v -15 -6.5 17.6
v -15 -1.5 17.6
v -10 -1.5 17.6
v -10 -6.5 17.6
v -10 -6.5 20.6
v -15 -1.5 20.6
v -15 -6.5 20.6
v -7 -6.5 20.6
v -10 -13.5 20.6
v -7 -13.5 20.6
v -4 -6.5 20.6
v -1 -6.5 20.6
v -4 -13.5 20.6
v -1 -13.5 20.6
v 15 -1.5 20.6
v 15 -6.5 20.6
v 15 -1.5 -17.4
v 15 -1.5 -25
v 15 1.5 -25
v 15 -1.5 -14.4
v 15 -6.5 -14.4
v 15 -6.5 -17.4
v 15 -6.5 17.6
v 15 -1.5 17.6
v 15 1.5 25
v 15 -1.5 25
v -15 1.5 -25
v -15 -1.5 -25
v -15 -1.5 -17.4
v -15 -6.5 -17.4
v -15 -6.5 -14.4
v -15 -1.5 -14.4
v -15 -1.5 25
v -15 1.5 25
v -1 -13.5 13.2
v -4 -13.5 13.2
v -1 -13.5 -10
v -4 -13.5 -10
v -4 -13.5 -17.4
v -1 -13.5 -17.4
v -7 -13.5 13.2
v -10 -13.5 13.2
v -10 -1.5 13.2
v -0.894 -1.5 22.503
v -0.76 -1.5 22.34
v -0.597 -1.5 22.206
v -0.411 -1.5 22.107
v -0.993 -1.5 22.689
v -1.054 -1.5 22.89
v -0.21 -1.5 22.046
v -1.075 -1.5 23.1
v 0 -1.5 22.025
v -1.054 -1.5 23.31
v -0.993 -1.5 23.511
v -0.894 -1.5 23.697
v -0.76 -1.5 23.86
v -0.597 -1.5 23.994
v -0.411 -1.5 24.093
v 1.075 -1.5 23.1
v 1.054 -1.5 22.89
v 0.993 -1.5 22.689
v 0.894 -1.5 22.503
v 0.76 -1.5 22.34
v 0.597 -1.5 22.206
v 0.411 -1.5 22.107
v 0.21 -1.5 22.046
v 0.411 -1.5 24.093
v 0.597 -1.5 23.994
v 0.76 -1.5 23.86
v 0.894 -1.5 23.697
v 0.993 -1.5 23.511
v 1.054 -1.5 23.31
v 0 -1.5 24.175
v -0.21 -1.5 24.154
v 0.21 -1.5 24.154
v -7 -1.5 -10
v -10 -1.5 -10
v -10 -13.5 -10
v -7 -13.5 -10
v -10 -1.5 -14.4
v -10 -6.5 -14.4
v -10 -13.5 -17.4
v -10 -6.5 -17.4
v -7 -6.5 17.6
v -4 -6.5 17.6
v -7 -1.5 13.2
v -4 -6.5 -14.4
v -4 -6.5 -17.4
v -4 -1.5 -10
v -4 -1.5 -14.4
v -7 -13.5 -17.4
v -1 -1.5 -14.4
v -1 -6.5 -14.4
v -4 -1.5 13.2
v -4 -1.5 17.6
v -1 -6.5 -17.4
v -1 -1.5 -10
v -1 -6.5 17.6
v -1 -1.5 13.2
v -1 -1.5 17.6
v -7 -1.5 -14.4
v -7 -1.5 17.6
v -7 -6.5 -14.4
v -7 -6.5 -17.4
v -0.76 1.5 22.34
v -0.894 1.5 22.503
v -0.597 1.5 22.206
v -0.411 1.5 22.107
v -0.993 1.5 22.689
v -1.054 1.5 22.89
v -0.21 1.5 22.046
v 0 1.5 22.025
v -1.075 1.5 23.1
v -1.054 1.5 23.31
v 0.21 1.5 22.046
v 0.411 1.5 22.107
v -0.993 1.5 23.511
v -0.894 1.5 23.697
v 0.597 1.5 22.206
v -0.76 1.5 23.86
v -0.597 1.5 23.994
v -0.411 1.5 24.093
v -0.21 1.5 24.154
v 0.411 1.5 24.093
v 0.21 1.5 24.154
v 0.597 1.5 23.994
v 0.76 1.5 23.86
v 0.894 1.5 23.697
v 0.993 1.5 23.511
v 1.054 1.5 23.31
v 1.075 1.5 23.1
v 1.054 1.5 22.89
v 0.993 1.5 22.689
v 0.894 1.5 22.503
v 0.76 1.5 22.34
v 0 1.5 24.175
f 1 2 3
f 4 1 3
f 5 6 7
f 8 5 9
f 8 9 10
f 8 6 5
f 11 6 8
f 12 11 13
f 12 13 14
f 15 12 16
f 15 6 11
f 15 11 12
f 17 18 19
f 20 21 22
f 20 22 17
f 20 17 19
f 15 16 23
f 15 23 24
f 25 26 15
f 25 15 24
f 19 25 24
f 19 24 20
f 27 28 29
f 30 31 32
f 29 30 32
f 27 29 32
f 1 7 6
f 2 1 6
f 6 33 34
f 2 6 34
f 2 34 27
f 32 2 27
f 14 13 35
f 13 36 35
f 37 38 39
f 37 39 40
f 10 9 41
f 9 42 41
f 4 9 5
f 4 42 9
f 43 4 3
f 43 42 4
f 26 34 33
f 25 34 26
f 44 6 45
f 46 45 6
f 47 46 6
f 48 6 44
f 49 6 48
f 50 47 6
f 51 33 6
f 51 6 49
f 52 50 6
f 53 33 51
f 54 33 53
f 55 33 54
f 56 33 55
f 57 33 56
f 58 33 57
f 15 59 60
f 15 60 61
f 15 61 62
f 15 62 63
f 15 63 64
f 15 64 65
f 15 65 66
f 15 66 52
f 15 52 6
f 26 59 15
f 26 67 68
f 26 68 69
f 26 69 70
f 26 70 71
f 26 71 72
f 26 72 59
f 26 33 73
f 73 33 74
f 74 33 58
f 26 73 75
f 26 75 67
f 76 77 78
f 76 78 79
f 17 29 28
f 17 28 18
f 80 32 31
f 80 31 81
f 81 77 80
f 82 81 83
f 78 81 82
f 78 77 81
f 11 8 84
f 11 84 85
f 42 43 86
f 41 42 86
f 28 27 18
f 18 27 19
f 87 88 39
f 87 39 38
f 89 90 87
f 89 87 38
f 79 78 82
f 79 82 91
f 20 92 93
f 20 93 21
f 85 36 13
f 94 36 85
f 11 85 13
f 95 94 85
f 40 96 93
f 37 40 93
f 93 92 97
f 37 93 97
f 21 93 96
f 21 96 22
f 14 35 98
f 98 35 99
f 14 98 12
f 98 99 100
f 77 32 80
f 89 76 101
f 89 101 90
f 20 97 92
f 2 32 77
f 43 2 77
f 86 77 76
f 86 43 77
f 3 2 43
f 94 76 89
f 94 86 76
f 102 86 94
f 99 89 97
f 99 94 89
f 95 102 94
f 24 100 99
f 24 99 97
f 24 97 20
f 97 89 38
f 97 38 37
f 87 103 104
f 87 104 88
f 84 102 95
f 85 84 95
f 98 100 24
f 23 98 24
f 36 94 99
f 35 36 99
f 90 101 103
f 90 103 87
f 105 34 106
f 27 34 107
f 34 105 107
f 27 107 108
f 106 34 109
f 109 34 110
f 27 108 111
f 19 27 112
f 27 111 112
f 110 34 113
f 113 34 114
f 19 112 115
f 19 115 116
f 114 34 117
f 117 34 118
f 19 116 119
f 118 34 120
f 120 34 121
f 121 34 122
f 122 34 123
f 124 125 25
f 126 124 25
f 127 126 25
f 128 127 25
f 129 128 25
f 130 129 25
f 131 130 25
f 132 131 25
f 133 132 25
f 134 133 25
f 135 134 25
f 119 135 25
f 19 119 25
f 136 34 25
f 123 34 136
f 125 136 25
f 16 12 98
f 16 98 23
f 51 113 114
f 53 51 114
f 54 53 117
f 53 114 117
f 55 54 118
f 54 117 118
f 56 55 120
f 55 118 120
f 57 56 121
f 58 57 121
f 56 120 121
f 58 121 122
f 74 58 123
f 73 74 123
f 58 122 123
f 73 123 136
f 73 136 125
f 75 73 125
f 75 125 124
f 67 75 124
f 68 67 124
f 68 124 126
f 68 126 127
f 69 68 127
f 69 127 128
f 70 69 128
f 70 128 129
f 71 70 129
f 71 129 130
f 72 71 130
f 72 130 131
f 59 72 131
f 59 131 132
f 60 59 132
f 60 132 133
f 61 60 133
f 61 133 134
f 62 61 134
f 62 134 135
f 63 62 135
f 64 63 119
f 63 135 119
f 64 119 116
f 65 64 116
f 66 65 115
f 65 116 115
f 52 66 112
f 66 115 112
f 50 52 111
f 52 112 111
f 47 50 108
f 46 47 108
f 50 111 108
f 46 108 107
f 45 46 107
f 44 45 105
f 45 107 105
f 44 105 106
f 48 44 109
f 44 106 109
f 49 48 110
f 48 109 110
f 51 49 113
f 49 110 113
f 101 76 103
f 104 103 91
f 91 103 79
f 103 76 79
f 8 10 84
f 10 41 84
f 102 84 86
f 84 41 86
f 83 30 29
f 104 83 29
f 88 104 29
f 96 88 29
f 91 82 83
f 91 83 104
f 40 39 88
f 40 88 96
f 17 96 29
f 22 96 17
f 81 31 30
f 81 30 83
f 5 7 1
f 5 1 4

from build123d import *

# Parameters (mm, degrees)
F0_W      = 30
F0_H      = 3
F1_DEPTH  = 25
F2_W      = 30
F2_H      = 3
F3_DEPTH  = 5
F5_D      = 2.15
F5_DEPTH  = 29.55
F5_TIP    = 0.6459251655
F6_W      = 3
F6_H      = 4.4
F7_DEPTH  = 12
F8_W      = 3
F8_H      = 7
F9_DEPTH  = 3
F10_W     = 3
F10_H     = 7
F11_DEPTH = 3


with BuildPart() as f1:
    # F0 (on Top) → F1 (new body, symmetric)
    with BuildSketch(Plane.XY):
        Rectangle(F0_W, F0_H)
    extrude(amount=F1_DEPTH, both=True)

    # F2 (on face) → F3 (join)
    with BuildSketch(Plane.XZ.offset(1.5)):
        with Locations((0, 19.1)):
            Rectangle(F2_W, F2_H)
        with Locations((0, -15.9)):
            Rectangle(F2_W, F2_H)
    extrude(amount=F3_DEPTH)

    # F5
    with Locations(Plane.XZ.offset(1.5)):
        with Locations((0, 23.1)):
            Hole(F5_D / 2, depth=F5_DEPTH)
            with Locations((0, 0, -(F5_DEPTH + F5_TIP / 2))):  # 118° drill point
                Cone(0, F5_D / 2, F5_TIP, mode=Mode.SUBTRACT)

    # F6 (on face) → F7 (join)
    with BuildSketch(Plane.XZ.offset(1.5)):
        with Locations((-8.5, 15.4)):
            Rectangle(F6_W, F6_H)
        with Locations((-2.5, 15.4)):
            Rectangle(F6_W, F6_H)
        with Locations((-8.5, -12.2)):
            Rectangle(F6_W, F6_H)
        with Locations((-2.5, -12.2)):
            Rectangle(F6_W, F6_H)
    extrude(amount=F7_DEPTH)

    # F8 (on face) → F9 (join, through all)
    with BuildSketch(Plane.XY.offset(17.6)):
        with Locations((-8.5, -10)):
            Rectangle(F8_W, F8_H)
        with Locations((-2.5, -10)):
            Rectangle(F8_W, F8_H)
    extrude(amount=F9_DEPTH)

    # F10 (on face) → F11 (join, through all)
    with BuildSketch(Plane(origin=(0, 0, -14.4), x_dir=(1, 0, 0), z_dir=(0, 0, -1))):
        with Locations((-8.5, 10)):
            Rectangle(F10_W, F10_H)
        with Locations((-2.5, 10)):
            Rectangle(F10_W, F10_H)
    extrude(amount=F11_DEPTH)


solid = f1.part
